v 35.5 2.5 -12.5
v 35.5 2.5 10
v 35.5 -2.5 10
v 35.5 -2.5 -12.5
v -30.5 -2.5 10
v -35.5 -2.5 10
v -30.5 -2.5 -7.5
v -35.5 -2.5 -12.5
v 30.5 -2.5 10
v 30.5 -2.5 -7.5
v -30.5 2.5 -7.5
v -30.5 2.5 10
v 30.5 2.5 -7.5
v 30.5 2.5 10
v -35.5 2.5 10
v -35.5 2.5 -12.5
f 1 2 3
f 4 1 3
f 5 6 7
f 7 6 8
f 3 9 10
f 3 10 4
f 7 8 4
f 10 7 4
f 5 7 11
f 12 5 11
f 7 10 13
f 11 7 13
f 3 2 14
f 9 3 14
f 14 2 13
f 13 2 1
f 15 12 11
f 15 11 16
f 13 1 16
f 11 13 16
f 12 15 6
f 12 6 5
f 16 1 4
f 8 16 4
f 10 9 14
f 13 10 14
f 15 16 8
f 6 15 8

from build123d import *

# Parameters (mm, degrees)
F2_W = 5
F2_H = 5


with BuildPart() as f3:
    # F3: sweep along a path in F0
    with BuildLine(Plane.XZ) as f3_path:
        Line((-33, 10), (-33, -10))
        Line((-33, -10), (33, -10))
        Line((33, -10), (33, 10))
    # F2 (on plane+point) → F3 (sweep)
    with BuildSketch(Plane.XY.offset(10)):
        with Locations((-33, 0)):
            Rectangle(F2_W, F2_H)
    sweep(path=f3_path.line, transition=Transition.RIGHT)


solid = f3.part
